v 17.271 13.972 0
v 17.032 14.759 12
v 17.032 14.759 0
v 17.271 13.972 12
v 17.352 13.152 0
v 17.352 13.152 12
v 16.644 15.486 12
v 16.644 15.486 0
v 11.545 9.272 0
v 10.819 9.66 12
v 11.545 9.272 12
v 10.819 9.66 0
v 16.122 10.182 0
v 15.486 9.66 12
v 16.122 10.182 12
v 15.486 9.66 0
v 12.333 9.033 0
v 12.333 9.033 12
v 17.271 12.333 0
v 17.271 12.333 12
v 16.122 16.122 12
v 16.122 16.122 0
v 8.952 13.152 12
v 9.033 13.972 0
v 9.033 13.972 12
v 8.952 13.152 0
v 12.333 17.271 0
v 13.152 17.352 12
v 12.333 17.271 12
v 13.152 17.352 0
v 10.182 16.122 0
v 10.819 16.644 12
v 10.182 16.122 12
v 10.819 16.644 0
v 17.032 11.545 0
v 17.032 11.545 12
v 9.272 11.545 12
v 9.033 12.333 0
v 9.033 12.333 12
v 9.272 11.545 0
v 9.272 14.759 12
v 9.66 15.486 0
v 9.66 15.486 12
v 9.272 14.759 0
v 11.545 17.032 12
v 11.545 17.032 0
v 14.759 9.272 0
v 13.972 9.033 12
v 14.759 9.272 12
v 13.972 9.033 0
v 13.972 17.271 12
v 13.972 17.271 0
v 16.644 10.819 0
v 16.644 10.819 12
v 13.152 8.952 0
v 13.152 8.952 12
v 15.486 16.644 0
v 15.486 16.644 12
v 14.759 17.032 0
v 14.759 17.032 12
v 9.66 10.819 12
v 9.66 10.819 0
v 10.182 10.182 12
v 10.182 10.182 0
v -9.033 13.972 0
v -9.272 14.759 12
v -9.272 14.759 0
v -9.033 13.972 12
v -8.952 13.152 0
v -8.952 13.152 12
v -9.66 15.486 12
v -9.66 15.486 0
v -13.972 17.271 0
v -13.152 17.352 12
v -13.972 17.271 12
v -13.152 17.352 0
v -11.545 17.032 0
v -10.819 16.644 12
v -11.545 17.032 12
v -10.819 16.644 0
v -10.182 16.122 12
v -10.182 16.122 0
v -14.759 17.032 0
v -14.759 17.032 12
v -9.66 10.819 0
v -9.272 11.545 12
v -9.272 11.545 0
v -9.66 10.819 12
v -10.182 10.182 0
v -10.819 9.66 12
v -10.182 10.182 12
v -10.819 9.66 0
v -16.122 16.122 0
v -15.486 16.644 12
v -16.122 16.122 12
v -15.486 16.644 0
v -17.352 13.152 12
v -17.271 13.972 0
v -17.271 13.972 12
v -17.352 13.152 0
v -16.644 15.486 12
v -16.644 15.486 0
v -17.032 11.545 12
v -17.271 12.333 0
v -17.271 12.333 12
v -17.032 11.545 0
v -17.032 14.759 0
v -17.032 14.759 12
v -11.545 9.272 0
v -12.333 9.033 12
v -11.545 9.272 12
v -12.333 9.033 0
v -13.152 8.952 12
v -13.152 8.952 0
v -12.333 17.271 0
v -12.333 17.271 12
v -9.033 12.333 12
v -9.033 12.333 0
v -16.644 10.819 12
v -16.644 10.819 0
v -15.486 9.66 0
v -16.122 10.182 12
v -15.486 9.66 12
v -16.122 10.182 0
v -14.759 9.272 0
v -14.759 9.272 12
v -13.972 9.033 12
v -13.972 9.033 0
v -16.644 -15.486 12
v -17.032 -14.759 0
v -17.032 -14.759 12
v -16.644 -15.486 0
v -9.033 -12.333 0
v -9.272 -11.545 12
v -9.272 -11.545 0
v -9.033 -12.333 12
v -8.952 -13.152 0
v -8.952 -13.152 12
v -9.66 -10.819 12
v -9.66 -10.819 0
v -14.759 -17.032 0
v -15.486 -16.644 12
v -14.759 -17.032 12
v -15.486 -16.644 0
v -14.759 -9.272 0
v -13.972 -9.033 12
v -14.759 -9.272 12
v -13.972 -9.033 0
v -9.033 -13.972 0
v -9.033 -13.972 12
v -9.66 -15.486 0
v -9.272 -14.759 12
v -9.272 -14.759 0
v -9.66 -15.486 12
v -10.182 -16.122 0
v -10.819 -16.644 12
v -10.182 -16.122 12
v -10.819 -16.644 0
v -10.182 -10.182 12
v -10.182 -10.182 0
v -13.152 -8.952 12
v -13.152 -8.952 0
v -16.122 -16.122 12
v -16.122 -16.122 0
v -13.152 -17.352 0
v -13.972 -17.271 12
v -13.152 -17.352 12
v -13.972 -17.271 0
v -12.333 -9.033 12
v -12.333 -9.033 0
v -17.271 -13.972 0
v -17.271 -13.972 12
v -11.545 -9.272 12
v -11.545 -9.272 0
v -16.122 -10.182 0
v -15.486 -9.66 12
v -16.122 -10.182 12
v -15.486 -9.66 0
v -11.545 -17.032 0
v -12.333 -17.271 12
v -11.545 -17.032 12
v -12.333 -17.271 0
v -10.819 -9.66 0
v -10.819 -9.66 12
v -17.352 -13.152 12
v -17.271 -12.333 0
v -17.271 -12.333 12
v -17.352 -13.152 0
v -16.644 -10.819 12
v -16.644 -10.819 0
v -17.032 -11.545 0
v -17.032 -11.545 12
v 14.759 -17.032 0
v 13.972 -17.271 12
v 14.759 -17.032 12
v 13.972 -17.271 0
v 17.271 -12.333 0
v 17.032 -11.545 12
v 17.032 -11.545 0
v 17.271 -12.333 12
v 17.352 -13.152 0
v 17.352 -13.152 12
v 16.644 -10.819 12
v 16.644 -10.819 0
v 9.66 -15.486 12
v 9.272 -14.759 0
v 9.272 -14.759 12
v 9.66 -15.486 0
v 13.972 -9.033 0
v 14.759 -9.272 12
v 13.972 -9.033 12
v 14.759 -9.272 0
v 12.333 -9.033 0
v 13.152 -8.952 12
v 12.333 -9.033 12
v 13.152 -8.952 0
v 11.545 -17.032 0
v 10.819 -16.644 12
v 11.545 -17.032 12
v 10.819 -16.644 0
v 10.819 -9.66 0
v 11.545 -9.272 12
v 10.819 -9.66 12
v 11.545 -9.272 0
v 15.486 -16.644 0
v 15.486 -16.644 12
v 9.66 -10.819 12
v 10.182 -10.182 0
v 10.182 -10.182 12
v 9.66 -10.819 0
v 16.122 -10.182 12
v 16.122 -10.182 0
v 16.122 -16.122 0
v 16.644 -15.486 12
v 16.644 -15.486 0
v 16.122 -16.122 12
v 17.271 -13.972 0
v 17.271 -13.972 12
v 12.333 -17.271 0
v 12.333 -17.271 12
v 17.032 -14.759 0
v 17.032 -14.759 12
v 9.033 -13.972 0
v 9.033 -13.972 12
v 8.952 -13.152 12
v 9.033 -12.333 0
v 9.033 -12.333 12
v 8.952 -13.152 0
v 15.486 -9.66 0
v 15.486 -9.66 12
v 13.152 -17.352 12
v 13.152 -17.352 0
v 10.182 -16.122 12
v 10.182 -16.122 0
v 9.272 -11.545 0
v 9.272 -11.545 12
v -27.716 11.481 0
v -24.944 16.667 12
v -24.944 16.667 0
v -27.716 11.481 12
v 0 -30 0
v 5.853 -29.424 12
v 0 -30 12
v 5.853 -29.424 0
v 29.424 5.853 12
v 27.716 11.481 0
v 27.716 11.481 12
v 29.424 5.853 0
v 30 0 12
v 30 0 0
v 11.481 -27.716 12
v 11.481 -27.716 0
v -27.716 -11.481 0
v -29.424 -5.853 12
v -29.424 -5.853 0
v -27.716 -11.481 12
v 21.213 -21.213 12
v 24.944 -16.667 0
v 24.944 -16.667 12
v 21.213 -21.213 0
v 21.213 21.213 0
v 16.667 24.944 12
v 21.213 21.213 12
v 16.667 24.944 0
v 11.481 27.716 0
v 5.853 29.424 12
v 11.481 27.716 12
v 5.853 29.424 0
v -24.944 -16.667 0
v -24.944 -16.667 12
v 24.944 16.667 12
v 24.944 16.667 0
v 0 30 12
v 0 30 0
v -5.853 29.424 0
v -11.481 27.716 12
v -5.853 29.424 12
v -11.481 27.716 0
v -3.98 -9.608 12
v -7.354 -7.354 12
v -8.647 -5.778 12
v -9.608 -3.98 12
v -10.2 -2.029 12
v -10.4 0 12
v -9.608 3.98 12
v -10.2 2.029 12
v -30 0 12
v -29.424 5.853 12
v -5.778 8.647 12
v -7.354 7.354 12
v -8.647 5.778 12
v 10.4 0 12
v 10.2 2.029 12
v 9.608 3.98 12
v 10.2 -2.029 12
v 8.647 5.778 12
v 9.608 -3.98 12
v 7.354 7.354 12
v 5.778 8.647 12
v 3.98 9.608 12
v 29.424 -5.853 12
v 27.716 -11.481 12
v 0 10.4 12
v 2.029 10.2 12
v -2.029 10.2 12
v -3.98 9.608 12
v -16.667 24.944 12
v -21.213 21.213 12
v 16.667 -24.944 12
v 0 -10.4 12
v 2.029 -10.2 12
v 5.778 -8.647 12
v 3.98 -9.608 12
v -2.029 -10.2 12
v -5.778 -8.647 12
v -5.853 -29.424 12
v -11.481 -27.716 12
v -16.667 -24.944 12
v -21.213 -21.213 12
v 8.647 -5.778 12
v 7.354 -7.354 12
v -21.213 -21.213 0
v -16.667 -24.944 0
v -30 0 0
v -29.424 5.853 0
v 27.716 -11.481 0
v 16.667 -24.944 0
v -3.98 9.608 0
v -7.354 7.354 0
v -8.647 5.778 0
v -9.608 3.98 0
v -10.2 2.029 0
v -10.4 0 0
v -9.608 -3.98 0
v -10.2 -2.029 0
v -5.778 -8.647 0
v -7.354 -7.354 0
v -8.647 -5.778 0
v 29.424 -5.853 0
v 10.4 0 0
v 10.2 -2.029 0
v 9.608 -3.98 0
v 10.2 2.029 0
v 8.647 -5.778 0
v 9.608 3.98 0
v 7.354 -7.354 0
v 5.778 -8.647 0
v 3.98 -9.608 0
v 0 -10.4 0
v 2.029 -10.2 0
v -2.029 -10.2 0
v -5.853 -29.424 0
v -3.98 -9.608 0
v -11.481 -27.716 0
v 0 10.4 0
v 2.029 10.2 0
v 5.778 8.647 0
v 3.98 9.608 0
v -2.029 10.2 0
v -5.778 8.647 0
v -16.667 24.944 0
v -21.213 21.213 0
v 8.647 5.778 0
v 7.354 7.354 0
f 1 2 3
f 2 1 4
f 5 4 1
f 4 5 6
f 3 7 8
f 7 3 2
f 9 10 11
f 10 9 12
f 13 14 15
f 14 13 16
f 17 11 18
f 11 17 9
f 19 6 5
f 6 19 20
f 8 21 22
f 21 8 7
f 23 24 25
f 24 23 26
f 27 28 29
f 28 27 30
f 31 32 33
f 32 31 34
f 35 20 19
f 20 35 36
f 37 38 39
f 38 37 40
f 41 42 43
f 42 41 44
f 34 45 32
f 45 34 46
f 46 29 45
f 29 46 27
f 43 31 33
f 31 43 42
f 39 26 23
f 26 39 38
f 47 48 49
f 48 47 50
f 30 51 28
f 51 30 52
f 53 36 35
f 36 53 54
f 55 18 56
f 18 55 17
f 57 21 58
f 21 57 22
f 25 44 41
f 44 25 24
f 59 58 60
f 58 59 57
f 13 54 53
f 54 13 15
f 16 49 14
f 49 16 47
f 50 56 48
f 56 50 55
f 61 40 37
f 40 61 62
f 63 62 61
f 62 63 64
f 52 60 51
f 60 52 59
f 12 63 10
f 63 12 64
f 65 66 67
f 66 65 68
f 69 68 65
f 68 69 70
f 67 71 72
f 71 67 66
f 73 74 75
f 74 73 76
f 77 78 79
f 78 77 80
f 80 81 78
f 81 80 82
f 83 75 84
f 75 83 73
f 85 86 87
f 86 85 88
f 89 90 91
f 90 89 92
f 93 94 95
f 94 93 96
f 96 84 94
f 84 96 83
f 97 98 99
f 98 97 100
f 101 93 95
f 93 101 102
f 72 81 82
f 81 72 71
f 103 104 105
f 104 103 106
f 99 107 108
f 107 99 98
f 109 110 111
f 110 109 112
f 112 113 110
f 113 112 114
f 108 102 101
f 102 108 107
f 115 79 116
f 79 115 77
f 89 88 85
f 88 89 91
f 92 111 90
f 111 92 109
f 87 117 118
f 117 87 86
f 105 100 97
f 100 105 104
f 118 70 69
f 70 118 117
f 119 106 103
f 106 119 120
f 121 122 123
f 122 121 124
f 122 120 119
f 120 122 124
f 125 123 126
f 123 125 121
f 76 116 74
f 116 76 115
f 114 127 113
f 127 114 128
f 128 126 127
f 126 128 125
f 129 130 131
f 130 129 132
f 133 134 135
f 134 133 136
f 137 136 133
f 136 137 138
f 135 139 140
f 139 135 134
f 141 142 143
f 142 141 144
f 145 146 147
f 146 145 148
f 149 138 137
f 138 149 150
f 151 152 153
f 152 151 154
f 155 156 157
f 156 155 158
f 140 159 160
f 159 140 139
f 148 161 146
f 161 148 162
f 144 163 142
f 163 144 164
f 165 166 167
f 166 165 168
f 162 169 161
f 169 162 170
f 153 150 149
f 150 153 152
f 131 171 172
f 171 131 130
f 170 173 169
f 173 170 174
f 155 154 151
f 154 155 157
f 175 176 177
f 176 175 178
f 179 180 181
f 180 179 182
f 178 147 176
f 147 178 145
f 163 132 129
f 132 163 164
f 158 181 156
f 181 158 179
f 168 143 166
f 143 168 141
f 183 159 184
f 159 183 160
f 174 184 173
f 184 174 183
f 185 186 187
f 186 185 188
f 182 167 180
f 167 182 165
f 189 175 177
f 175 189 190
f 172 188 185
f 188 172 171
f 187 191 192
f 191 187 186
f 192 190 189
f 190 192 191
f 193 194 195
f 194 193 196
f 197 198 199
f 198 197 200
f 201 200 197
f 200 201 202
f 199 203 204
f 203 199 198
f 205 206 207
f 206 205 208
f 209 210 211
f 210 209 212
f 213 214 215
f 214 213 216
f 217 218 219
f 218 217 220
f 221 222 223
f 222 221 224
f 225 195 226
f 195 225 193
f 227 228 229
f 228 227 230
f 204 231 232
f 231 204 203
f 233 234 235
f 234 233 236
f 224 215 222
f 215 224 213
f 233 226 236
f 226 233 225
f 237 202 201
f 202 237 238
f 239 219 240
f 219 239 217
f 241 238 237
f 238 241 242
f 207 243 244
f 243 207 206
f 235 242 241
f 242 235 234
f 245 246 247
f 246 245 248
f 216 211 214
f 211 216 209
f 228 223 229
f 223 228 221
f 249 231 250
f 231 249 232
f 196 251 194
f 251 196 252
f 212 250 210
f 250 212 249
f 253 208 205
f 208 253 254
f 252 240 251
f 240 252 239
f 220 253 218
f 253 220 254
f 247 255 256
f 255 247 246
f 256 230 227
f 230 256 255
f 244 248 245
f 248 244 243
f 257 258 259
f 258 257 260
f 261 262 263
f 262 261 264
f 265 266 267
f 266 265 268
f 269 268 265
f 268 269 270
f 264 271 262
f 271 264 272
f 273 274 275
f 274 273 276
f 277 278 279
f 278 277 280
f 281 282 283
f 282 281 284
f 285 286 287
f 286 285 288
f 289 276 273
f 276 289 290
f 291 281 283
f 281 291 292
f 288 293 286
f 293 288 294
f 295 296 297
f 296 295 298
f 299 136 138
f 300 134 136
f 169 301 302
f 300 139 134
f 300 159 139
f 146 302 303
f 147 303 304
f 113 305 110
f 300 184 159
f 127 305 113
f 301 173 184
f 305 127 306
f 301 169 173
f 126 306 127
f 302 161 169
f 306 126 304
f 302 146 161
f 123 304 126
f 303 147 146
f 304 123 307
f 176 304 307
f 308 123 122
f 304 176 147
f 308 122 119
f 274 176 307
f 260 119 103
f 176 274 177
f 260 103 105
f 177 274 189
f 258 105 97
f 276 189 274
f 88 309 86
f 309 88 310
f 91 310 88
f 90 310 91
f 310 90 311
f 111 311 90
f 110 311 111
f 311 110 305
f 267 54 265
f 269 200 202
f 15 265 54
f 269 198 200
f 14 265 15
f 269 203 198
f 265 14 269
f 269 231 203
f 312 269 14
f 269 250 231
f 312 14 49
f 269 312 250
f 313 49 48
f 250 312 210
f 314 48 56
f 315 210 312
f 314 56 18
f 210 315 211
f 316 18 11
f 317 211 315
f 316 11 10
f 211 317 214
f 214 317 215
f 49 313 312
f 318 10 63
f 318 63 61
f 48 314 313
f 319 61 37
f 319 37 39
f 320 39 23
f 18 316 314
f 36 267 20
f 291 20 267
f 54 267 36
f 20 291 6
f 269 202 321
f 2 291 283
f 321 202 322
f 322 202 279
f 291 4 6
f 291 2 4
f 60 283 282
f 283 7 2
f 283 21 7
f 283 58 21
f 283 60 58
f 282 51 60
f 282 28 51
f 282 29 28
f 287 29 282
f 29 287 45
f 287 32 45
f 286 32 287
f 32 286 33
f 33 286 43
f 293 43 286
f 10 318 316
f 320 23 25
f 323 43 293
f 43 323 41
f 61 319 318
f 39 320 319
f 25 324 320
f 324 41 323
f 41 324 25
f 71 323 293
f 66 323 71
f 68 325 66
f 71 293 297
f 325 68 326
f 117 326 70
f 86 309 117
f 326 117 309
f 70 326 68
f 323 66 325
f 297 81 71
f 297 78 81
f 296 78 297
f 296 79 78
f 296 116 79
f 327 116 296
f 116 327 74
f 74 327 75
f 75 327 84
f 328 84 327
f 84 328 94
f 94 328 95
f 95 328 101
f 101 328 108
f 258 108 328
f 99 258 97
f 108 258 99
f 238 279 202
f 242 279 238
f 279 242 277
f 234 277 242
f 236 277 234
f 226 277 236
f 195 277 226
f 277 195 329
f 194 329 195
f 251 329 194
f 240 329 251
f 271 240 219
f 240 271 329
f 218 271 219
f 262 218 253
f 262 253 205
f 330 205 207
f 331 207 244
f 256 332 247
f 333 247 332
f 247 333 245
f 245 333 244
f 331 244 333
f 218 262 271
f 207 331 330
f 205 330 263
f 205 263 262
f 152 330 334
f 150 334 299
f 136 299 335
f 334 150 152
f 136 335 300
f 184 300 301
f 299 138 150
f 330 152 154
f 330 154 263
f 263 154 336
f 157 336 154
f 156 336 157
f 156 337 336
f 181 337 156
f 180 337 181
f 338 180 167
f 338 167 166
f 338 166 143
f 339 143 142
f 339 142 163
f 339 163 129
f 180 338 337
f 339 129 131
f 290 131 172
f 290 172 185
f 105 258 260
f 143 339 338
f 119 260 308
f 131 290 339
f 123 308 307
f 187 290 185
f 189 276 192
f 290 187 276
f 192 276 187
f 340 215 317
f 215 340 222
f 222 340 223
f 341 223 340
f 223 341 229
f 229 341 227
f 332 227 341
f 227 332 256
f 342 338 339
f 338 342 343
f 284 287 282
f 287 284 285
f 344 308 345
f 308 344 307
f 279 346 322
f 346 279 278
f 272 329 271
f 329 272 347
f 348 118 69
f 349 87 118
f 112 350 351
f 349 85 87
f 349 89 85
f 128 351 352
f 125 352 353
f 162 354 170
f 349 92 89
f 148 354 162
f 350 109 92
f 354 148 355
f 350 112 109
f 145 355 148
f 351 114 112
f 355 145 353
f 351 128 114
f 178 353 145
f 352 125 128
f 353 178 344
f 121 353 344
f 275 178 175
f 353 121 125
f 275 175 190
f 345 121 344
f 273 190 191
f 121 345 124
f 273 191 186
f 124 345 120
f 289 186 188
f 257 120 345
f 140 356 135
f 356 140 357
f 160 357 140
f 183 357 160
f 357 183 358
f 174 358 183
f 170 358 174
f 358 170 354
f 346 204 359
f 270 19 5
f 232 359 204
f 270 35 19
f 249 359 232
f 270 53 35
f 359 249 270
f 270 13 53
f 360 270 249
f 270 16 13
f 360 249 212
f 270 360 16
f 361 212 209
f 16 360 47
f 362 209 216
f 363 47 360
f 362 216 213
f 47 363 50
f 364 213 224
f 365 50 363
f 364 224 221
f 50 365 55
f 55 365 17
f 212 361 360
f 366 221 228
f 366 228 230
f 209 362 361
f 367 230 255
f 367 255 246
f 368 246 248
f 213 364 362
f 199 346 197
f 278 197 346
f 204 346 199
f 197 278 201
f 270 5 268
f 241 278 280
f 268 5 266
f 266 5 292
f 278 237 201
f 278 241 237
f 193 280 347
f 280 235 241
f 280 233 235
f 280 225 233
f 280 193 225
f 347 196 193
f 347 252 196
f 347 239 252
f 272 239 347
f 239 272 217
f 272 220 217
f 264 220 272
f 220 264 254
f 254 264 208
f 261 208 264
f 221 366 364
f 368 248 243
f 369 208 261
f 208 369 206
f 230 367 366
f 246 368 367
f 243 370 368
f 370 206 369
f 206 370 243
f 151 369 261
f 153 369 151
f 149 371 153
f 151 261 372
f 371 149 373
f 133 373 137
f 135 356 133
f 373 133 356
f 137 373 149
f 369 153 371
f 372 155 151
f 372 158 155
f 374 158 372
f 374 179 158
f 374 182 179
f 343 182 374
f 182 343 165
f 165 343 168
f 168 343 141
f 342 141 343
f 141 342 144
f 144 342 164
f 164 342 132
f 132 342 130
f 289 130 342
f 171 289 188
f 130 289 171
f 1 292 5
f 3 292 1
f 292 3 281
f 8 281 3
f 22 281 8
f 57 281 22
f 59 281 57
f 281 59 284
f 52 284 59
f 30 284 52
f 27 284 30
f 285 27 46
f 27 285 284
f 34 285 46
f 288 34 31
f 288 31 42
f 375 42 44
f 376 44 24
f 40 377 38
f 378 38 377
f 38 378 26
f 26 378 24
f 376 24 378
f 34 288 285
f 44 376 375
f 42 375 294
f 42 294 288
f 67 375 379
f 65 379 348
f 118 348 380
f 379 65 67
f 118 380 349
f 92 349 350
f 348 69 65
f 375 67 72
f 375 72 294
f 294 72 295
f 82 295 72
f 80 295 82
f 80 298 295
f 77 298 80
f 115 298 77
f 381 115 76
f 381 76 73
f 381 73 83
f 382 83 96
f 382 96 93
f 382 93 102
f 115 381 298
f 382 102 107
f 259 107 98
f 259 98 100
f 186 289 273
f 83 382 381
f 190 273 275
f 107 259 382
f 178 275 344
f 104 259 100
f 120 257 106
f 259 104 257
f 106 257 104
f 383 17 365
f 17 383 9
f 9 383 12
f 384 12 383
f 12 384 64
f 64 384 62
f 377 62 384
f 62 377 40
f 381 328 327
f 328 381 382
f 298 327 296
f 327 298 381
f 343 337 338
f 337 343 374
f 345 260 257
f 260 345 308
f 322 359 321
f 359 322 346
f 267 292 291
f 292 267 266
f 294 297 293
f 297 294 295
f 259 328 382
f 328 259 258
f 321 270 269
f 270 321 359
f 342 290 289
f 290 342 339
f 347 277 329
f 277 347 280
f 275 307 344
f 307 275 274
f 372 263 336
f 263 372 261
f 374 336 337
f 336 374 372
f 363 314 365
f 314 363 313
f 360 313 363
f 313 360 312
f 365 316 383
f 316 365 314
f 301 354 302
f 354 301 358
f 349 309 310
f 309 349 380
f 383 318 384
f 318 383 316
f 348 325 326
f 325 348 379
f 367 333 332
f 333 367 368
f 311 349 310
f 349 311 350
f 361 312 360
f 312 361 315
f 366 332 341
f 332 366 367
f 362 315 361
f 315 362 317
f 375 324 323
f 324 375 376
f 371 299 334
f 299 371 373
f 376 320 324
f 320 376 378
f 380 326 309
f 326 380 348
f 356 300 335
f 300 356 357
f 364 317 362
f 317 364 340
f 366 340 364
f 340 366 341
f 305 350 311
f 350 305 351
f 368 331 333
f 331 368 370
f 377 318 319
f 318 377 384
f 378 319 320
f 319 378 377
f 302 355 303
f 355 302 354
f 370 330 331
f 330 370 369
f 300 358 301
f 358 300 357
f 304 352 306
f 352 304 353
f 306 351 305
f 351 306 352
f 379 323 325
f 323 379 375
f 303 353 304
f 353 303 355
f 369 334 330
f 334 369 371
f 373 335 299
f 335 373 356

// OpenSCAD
$fn = 32;

// ----------------------------------------------------------------------
// Flange Ø60 x 12
// 4 holes on a Ø37.2 bolt circle, bolted joints
// ----------------------------------------------------------------------

// --- parameters (mm) ---
flange_d = 60;   // outside diameter of the flange
thickness = 12;  // flange thickness
holes = 4;       // number of bolt holes
pcd = 37.2;      // bolt circle diameter
start_deg = 45;  // angle of the first hole, from +X
hole_d = 8.4;    // bolt hole diameter
bore_d = 20.8;   // central through bore
hub_d = 32.8;    // hub outside diameter
hub_h = 0;       // hub height above the flange face (0 = no hub)

// --- derived feature positions (mm) ---
height = thickness + hub_h;  // = 12   overall height of the part
pcd_r = pcd / 2;             // = 18.6   bolt circle radius
hole_step = 360 / holes;     // = 90   angular pitch
feature_centers = [
  [pcd_r * cos(start_deg + 0 * hole_step), pcd_r * sin(start_deg + 0 * hole_step)],
  [pcd_r * cos(start_deg + 1 * hole_step), pcd_r * sin(start_deg + 1 * hole_step)],
  [pcd_r * cos(start_deg + 2 * hole_step), pcd_r * sin(start_deg + 2 * hole_step)],
  [pcd_r * cos(start_deg + 3 * hole_step), pcd_r * sin(start_deg + 3 * hole_step)]
];   // bolt hole centres on the pitch circle

// flange disc, every hole and the bore cut straight through
difference() {
  union() {
    cylinder(d = flange_d, h = thickness);
  }
  translate([0, 0, -1]) cylinder(d = bore_d, h = height + 2);  // bore, through
  for (centre = feature_centers)
    translate([centre[0], centre[1], -1]) cylinder(d = hole_d, h = thickness + 2);
}
